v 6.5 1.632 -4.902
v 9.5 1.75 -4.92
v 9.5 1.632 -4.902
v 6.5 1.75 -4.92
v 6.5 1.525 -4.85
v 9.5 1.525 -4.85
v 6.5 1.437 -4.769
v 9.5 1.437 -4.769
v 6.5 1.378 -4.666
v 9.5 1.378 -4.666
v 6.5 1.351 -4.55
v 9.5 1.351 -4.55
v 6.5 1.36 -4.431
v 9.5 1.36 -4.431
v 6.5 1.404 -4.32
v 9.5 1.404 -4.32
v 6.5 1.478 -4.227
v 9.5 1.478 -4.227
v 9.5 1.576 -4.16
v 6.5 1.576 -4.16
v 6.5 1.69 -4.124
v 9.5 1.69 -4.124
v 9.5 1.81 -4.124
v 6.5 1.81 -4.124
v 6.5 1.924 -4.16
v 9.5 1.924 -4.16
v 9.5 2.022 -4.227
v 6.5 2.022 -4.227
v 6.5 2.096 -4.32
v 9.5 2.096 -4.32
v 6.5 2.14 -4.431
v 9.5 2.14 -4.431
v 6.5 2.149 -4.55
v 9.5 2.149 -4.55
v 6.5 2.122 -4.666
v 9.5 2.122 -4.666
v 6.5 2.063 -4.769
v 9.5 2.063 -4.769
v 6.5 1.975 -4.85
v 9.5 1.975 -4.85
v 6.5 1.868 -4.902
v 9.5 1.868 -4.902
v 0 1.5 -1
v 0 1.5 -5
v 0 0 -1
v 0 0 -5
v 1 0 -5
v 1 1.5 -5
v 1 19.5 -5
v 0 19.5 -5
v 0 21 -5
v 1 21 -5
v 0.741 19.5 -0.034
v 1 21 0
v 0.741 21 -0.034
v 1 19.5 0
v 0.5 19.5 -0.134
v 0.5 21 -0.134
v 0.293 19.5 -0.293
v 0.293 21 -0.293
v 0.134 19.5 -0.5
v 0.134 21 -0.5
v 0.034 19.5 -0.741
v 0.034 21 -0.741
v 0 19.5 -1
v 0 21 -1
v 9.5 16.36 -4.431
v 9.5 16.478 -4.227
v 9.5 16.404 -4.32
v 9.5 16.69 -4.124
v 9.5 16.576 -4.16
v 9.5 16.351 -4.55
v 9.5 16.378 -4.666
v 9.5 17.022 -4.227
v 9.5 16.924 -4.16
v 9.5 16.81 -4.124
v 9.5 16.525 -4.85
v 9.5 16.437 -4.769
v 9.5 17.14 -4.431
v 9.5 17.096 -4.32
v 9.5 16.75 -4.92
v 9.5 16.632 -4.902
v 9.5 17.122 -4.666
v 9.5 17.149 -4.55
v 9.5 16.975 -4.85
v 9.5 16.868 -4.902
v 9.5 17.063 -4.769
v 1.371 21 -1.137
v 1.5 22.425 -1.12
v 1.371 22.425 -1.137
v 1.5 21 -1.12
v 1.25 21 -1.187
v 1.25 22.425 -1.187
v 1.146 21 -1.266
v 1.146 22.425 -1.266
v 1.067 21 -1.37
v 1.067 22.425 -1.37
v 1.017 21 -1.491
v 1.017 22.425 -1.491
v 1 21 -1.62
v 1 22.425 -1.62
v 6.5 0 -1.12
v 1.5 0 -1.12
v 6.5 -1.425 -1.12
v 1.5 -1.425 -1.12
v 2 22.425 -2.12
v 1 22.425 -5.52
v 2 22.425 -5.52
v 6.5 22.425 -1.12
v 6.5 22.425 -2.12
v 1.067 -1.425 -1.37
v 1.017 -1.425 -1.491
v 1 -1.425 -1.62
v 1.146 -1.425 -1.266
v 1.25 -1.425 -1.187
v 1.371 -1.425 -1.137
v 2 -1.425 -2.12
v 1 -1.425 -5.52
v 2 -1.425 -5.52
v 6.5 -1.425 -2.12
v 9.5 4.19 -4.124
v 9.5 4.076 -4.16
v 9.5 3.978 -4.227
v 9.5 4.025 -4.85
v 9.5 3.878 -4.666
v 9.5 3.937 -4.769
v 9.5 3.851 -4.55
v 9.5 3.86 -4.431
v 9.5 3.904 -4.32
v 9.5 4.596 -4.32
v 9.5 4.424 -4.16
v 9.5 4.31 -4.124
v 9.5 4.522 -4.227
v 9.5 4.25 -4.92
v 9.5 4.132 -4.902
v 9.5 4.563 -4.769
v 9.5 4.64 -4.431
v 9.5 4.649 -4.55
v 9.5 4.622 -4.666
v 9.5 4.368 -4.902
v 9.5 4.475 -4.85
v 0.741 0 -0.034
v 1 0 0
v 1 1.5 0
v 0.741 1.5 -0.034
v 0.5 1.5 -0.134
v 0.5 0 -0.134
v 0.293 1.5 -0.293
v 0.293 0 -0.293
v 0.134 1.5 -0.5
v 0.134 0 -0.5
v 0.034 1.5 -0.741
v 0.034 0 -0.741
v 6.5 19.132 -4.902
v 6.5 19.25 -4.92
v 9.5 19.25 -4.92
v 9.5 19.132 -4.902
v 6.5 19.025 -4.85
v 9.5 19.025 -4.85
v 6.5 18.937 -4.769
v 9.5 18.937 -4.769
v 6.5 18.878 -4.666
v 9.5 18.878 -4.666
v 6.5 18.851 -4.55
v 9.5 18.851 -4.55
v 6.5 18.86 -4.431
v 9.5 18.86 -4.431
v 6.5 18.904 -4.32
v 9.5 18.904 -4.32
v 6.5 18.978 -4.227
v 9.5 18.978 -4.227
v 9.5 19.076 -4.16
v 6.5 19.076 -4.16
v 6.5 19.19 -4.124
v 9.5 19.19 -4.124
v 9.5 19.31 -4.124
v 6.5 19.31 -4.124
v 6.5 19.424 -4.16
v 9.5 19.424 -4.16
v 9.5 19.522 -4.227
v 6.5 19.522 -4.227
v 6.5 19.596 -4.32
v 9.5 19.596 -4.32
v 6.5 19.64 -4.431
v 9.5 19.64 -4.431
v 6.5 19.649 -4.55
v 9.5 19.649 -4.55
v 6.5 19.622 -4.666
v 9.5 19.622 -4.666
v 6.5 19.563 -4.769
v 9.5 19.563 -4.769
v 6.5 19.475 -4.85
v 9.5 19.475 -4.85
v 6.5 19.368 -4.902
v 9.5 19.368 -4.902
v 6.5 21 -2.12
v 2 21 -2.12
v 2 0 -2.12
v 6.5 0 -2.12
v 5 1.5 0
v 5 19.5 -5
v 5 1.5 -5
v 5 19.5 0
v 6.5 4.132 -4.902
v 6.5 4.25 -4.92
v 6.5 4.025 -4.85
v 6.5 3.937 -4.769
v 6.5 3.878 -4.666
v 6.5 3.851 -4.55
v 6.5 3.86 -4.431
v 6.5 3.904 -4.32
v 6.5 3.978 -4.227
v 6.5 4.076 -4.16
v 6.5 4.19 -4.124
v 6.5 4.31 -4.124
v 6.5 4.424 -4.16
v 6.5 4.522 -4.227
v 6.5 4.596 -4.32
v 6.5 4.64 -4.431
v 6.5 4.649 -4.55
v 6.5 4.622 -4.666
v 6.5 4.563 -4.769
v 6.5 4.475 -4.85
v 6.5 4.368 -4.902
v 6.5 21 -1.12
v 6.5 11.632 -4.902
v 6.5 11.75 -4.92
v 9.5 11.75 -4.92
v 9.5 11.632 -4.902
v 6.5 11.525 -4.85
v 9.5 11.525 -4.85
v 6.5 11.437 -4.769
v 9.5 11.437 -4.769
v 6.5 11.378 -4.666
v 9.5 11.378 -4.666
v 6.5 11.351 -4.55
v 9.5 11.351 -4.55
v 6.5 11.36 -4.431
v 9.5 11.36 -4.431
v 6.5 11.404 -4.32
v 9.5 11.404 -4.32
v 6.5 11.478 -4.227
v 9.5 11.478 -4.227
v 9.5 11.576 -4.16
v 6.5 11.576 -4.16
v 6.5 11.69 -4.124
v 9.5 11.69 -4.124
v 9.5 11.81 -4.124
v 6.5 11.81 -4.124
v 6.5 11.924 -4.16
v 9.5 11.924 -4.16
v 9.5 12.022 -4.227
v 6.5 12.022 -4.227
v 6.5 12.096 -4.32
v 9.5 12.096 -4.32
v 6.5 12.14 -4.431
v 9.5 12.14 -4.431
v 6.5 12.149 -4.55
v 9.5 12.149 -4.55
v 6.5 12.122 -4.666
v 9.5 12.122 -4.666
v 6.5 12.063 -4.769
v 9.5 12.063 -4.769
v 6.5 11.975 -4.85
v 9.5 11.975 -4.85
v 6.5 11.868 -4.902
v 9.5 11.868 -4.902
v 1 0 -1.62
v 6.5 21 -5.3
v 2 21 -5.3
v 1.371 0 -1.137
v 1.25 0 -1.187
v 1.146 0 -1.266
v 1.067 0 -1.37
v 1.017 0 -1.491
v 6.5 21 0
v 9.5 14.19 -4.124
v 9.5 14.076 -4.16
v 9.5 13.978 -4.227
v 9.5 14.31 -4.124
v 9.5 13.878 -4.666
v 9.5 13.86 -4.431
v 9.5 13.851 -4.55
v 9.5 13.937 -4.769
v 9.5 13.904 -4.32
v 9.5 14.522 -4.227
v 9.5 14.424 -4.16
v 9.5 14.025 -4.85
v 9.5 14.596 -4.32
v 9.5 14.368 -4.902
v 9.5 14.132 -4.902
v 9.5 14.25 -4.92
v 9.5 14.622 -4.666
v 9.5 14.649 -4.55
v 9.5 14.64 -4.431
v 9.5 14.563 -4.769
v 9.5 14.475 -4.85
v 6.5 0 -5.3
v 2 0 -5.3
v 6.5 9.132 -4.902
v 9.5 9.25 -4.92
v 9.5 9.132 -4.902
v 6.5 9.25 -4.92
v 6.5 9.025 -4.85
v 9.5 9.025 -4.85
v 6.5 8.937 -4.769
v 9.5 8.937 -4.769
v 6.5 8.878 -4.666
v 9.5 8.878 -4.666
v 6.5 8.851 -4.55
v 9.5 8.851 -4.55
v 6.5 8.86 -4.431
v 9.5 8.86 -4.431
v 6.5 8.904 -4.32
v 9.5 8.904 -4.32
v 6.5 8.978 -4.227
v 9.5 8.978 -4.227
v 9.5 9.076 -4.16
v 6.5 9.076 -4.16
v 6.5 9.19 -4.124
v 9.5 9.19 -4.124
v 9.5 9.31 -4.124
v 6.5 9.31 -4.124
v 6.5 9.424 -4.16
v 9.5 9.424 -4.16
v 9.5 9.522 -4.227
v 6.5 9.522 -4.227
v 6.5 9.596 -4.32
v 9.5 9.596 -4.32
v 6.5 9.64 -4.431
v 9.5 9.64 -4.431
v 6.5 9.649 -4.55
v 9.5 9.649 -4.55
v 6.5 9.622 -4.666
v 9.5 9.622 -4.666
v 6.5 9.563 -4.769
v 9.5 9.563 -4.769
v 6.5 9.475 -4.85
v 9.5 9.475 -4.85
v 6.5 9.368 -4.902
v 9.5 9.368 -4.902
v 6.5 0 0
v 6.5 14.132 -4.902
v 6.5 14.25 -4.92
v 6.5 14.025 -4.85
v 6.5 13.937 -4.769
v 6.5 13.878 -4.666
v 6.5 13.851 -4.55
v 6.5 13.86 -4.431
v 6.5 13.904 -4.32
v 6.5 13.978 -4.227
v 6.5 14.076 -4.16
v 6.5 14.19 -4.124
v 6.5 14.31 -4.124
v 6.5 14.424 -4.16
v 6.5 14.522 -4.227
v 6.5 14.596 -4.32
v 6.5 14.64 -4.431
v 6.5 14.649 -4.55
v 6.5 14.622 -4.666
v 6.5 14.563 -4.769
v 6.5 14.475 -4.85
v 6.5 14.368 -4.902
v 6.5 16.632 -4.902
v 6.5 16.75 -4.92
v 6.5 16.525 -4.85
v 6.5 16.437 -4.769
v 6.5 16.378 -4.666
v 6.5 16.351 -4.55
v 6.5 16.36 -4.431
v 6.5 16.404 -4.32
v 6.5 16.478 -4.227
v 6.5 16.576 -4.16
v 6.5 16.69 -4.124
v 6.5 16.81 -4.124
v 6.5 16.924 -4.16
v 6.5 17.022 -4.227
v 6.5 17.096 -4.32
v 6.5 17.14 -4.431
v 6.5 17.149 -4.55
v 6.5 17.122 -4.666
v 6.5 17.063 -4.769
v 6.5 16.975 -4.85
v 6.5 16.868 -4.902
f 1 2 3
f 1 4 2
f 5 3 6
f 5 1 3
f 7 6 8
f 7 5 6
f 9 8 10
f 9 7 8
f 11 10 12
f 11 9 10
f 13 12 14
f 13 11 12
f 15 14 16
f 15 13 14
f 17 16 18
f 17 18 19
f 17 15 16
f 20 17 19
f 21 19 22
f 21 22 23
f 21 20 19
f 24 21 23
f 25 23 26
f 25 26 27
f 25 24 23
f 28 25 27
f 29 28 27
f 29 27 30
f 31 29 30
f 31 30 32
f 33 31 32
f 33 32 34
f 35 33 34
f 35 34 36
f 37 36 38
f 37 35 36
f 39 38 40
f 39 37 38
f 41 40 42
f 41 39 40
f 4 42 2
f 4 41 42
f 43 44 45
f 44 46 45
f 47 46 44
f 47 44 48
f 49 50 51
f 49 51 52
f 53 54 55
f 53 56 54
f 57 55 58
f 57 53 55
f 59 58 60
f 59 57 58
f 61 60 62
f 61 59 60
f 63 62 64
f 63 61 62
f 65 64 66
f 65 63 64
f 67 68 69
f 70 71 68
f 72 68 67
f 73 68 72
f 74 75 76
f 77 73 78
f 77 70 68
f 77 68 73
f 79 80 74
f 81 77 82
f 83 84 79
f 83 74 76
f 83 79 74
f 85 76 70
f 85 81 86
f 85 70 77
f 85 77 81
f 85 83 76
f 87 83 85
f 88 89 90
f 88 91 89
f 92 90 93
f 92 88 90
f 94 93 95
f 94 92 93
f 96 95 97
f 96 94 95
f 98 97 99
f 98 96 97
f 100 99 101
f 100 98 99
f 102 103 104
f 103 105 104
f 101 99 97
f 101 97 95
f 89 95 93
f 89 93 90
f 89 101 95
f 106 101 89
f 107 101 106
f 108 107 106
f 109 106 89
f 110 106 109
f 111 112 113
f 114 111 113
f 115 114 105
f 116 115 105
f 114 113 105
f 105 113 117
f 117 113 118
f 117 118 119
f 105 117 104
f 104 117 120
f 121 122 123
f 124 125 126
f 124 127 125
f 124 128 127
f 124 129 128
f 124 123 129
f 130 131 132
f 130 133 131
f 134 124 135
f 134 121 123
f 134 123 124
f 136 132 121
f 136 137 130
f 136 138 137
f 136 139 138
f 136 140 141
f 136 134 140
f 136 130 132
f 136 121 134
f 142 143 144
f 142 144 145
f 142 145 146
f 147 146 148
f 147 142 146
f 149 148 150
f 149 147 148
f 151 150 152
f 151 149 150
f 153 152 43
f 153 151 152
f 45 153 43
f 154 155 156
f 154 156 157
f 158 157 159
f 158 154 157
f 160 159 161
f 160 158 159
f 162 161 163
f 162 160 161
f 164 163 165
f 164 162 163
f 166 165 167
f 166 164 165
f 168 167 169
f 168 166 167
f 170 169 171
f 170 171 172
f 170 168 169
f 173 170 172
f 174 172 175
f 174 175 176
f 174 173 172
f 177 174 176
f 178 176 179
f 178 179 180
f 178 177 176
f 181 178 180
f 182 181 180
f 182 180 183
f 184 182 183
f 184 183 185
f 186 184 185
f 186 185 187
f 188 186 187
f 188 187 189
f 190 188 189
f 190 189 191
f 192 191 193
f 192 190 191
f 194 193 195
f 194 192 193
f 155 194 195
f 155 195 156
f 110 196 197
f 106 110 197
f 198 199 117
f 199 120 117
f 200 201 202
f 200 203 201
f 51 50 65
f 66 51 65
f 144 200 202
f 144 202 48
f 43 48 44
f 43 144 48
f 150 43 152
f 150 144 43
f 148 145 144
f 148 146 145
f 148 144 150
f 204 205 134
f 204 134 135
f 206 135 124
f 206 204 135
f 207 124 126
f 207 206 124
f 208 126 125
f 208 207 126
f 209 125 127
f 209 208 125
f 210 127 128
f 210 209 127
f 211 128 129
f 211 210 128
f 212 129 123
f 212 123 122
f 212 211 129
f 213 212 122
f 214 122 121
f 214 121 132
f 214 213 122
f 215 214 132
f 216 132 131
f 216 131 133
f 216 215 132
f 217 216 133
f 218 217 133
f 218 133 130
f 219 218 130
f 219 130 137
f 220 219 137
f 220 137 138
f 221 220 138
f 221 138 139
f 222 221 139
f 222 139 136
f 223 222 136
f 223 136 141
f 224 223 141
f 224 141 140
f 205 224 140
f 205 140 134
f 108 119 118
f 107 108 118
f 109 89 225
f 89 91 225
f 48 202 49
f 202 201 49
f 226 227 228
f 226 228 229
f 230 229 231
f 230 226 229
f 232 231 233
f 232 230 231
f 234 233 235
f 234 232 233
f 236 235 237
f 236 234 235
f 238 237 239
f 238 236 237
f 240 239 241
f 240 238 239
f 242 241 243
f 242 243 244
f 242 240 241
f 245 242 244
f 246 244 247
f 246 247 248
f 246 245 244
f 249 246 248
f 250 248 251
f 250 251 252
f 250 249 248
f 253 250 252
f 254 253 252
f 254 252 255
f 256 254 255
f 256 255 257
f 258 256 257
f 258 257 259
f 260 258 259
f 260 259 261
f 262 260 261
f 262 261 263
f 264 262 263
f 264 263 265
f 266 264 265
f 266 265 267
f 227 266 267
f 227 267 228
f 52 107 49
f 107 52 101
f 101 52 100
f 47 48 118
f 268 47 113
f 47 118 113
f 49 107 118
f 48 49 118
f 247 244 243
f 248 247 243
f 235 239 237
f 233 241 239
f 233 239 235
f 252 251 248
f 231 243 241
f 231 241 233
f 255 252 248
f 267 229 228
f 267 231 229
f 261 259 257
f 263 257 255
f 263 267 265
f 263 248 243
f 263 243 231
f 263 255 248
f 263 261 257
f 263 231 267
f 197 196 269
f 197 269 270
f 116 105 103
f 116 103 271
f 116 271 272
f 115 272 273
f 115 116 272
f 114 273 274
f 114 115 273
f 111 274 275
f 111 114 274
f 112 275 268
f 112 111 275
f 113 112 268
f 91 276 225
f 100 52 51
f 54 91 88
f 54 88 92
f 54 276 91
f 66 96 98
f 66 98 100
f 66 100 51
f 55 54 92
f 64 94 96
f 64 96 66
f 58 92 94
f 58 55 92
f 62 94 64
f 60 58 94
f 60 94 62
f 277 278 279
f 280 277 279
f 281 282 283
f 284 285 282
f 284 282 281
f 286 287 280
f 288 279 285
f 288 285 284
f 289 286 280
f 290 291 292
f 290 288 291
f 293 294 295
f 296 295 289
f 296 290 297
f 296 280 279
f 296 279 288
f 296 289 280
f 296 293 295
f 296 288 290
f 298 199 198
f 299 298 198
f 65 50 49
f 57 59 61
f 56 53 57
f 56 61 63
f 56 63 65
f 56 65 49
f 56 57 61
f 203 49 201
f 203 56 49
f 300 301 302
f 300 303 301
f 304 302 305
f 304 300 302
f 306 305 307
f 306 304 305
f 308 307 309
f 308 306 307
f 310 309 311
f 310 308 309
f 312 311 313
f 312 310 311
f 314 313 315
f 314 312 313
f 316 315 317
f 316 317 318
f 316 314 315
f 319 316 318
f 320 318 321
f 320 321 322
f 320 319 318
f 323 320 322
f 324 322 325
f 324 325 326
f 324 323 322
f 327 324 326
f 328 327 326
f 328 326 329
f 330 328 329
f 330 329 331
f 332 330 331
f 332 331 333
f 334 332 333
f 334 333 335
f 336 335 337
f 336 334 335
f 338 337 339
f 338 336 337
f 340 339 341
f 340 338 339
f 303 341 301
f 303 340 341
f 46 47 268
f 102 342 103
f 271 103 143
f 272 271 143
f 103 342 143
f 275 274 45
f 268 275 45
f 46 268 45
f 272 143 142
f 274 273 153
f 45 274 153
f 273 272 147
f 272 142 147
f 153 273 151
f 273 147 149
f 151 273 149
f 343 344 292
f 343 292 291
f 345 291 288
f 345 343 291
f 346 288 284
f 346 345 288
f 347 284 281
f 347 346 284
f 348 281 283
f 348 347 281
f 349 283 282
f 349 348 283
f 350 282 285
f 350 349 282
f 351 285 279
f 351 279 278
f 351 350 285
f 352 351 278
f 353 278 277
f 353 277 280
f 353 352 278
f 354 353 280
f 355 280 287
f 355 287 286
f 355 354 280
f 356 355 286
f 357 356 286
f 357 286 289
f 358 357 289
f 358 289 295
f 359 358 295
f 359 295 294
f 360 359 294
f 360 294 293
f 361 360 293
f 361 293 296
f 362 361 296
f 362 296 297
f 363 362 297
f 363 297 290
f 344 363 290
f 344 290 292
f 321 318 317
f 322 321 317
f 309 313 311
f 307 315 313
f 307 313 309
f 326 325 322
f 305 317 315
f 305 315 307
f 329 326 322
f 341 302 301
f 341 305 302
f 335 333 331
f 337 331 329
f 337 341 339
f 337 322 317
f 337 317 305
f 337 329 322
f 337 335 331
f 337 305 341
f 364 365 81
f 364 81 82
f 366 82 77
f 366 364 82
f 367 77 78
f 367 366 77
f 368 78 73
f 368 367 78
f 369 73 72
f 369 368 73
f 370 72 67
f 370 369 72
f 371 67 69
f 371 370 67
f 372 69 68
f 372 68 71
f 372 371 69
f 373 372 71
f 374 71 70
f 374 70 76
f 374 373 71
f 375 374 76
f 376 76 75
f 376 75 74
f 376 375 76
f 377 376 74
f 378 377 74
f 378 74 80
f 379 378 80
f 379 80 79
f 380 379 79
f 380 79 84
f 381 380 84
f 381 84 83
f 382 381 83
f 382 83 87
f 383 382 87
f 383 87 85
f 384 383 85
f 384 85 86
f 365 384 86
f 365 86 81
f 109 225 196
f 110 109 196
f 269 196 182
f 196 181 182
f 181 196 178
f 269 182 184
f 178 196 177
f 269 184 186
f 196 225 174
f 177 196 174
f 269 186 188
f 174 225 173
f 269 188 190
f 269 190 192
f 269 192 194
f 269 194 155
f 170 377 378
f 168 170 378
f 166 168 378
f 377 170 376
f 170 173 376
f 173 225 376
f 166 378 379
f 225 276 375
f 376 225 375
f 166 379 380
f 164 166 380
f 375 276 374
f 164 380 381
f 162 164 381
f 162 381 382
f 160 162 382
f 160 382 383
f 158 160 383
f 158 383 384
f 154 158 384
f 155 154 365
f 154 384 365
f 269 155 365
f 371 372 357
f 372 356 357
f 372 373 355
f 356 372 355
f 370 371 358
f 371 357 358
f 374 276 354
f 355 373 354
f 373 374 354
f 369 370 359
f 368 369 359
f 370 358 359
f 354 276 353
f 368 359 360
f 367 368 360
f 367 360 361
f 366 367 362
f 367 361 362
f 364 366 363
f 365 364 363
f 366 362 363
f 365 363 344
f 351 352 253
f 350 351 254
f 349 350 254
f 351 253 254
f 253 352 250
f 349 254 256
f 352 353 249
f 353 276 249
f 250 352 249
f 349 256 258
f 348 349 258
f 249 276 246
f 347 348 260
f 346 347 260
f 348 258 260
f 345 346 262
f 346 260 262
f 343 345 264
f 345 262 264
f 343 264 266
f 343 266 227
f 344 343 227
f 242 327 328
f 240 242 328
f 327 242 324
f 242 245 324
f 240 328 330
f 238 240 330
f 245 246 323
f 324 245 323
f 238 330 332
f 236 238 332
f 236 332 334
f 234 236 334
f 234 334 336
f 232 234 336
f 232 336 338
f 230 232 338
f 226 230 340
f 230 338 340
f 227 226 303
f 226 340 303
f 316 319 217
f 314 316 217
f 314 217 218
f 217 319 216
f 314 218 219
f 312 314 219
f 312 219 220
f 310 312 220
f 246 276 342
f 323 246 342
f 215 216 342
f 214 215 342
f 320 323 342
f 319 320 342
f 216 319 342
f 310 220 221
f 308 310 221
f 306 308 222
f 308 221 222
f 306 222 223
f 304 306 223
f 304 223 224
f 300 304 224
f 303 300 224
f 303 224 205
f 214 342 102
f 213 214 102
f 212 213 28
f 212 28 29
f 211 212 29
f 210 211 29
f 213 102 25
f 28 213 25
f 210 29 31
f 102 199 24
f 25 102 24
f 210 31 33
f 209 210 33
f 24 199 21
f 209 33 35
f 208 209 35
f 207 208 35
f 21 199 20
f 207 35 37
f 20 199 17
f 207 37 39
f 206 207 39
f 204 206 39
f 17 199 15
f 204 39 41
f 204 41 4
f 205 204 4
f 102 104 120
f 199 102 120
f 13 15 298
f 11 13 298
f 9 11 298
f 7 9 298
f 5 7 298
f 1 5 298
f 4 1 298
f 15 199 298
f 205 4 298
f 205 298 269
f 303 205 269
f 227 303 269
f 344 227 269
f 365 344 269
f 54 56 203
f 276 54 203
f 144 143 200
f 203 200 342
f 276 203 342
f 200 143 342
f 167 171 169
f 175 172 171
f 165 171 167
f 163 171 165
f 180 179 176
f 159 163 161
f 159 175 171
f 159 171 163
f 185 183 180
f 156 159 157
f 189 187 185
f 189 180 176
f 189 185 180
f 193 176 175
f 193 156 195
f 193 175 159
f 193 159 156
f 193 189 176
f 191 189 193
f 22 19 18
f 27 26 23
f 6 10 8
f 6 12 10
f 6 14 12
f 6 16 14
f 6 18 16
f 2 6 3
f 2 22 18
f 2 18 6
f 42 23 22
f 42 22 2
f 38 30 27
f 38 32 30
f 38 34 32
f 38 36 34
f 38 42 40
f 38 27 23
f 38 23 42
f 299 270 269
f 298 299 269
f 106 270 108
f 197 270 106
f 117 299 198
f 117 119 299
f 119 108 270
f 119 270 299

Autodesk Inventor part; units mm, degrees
ref_plane "YZ Plane" through (0, 0, 0) normal (1, 0, 0) x (0, 1, 0)
ref_plane "XZ Plane" through (0, 0, 0) normal (0, 1, 0) x (-1, 0, 0)
ref_plane "XY Plane" through (0, 0, 0) normal (0, 0, 1) x (1, 0, 0)
sketch "Эскиз1" plane through (0, 0, 0) normal (0, 1, 0) x (-1, 0, 0)
  line L0 (0, -5) -> (-1, -5)
  line L1 (-1, -5) -> (-3, -5)
  line L2 (-1, -5) -> (-6.5, -5)
  line L3 (-6.5, -5) -> (-6.5, -5)
  line L4 (0, -5) -> (0, -1)
  line L5 (-1, 0) -> (-6.5, 0)
  line L6 (-6.5, 0) -> (-6.5, -5)
  line L7 (-1, -5) -> (-1, -1.1)
  line L8 (-1.5, -0.6) -> (-6.5, -0.6)
  line L9 (-6.5, -0.6) -> (-6.5, -5)
  line L10 (-2, -5) -> (-2, -1.6)
  line L11 (-2, -1.6) -> (-5.5, -1.6)
  line L12 (-5.5, -1.6) -> (-5.5, -5.52)
  line L13 (-5.5, -1.6) -> (-6.5, -1.6)
  arc A0 (0, -1) -> (-1, 0) centre (-1, -1) ccw
  arc A1 (-1, -1.1) -> (-1.5, -0.6) centre (-1.5, -1.1) ccw
  point P0 (0, 0)
  point P1 (0, 0)
  point P2 (-1, -0.6)
  point P3 (-4.25, -5.52)
  dimension "d2" = 1
  dimension "d31" = 5
  dimension "d32" = 4.4
  dimension "d74" = 6.5
  dimension "d75" = 1
  dimension "d76" = 1
  dimension "d77" = 0.5
extrude "Выдавливание1" add sketch "Эскиз1" along normal blind 21
sketch "Эскиз2" plane through (0, 21, 0) normal (0, 1, 0) x (1, 0, 0)
  line L0 (6.5, 5.52) -> (1, 5.52)
  line L1 (1, 5.52) -> (1, 1.62)
  line L2 (1.5, 1.12) -> (6.5, 1.12)
  line L3 (6.5, 1.12) -> (6.5, 5.52)
  line L4 (6.5, 5) -> (0, 5) projected
  line L5 (2, 2.12) -> (2, 4.52)
  line L6 (2, 4.52) -> (5.5, 4.52)
  line L7 (5.5, 4.52) -> (5.5, 2.12)
  line L8 (5.5, 2.12) -> (2, 2.12)
  line L9 (6.5, 5.52) -> (2, 5.52)
  line L10 (2, 5.52) -> (2, 2.12)
  line L11 (2, 2.12) -> (6.5, 2.12)
  line L12 (6.5, 2.12) -> (6.5, 5.52)
  arc A0 (1, 1.62) -> (1.5, 1.12) centre (1.5, 1.62) ccw
  point P0 (0, 0)
  point P1 (1, 1.12)
  point P2 (2, 5)
  point P3 (1, 5)
  point P4 (2, 5.52)
  dimension "d78" = 5.5
  dimension "d79" = 4.4
  dimension "d80" = 0.52
  dimension "d81" = 1
  dimension "d82" = 0.5
extrude "Выдавливание2" add sketch "Эскиз2" along normal blind 1.425 and the other way blind 22.425 contours L10 L4 L1 L0 | L10 L5 L8 L11 L3 L2 A0 L1 L4
sketch "Эскиз6" plane through (0, 0, 0) normal (0, 0, 1) x (1, 0, 0)
  line L0 (0, 0) -> (0, 1.5)
  line L1 (0, 0) -> (0, 21) projected
  line L2 (0, 21) -> (6.5, 21) projected
  line L3 (0, 21) -> (0, 19.5)
  line L4 (0, 19.5) -> (5, 19.5)
  line L5 (5, 19.5) -> (5, 1.5)
  line L6 (5, 1.5) -> (0, 1.5)
  line L7 (0, 1.5) -> (0, 19.5)
  dimension "d33" = 1.5
  dimension "d34" = 1.5
  dimension "d35" = 5
extrude "Выдавливание5" cut sketch "Эскиз6" against normal blind 5
sketch "Эскиз7" plane through (6.5, 0, 0) normal (1, 0, 0) x (0, 0, -1)
  line L0 (0, 0) -> (0, 21) projected
  line L1 (2.12, 21) -> (5, 21) projected
  line L2 (0, 0) -> (5, 0)
  line L3 (5, 0) -> (5, 21)
  line L4 (5, 21) -> (0, 21)
  line L5 (0, 21) -> (0, 0)
  line L6 (5, 0) -> (5, 21) projected
  line L7 (0, 19.5) -> (0, 1.5) projected
  line L8 (4.52, 10.5) -> (4.52, 19.25)
  line L9 (4.52, 19.25) -> (4.52, 1.75)
  line L10 (5, 10.5) -> (0, 10.5)
  line L11 (4.52, 19.25) -> (4.52, 16.75)
  line L12 (4.52, 16.75) -> (4.52, 14.25)
  line L13 (4.52, 14.25) -> (4.52, 11.75)
  line L14 (4.52, 11.75) -> (4.52, 9.25)
  line L15 (4.52, 9.25) -> (4.52, 6.75)
  line L16 (4.52, 6.75) -> (4.52, 4.25)
  circle A0 centre (4.52, 4.25) radius 0.4
  circle A1 centre (4.52, 1.75) radius 0.4
  circle A2 centre (4.52, 9.25) radius 0.4
  circle A3 centre (4.52, 11.75) radius 0.4
  circle A4 centre (4.52, 14.25) radius 0.4
  circle A5 centre (4.52, 16.75) radius 0.4
  circle A6 centre (4.52, 19.25) radius 0.4
  line L17 (5.52, -1.425) -> (5.52, 22.425) projected
  dimension "d84" = 17.5
  dimension "d85" = 2.5
  dimension "d86" = 2.5
  dimension "d87" = 2.5
  dimension "d88" = 2.5
  dimension "d89" = 2.5
  dimension "d90" = 2.5
  dimension "d91" = 0.8
  dimension "d92" = 0.8
  dimension "d93" = 0.8
  dimension "d94" = 0.8
  dimension "d95" = 0.8
  dimension "d96" = 0.8
  dimension "d97" = 0.8
  dimension "d101" = 1
extrude "Выдавливание6" add sketch "Эскиз7" along normal blind 3 contours A1 | A0 L9 | L9 A0 | A2 L9 | L9 A2 | A6 | A5 L8 | L8 A5 | A4 L8 | L8 A4 | A3 L8 | L8 A3
ref_plane "РабПлоскость1" through (0, 10.5, 0) normal (0, 1, 0) x (1, 0, 0)
sketch "Эскиз10" plane through (0, 21, 0) normal (0, 1, 0) x (1, 0, 0)
  line L0 (6.5, 5) -> (2, 5) projected
  line L1 (2, 2.12) -> (2, 5.52) projected
  line L2 (6.5, 5) -> (2, 5)
  line L3 (2, 5) -> (2, 5.3)
  line L4 (2, 5.3) -> (6.5, 5.3)
  line L5 (6.5, 5.3) -> (6.5, 5)
  point P0 (0, 0)
  dimension "d98" = 0.3
extrude "Выдавливание7" add sketch "Эскиз10" against normal up to surface (21 mm away)
properties part number "battery_header 7P"
